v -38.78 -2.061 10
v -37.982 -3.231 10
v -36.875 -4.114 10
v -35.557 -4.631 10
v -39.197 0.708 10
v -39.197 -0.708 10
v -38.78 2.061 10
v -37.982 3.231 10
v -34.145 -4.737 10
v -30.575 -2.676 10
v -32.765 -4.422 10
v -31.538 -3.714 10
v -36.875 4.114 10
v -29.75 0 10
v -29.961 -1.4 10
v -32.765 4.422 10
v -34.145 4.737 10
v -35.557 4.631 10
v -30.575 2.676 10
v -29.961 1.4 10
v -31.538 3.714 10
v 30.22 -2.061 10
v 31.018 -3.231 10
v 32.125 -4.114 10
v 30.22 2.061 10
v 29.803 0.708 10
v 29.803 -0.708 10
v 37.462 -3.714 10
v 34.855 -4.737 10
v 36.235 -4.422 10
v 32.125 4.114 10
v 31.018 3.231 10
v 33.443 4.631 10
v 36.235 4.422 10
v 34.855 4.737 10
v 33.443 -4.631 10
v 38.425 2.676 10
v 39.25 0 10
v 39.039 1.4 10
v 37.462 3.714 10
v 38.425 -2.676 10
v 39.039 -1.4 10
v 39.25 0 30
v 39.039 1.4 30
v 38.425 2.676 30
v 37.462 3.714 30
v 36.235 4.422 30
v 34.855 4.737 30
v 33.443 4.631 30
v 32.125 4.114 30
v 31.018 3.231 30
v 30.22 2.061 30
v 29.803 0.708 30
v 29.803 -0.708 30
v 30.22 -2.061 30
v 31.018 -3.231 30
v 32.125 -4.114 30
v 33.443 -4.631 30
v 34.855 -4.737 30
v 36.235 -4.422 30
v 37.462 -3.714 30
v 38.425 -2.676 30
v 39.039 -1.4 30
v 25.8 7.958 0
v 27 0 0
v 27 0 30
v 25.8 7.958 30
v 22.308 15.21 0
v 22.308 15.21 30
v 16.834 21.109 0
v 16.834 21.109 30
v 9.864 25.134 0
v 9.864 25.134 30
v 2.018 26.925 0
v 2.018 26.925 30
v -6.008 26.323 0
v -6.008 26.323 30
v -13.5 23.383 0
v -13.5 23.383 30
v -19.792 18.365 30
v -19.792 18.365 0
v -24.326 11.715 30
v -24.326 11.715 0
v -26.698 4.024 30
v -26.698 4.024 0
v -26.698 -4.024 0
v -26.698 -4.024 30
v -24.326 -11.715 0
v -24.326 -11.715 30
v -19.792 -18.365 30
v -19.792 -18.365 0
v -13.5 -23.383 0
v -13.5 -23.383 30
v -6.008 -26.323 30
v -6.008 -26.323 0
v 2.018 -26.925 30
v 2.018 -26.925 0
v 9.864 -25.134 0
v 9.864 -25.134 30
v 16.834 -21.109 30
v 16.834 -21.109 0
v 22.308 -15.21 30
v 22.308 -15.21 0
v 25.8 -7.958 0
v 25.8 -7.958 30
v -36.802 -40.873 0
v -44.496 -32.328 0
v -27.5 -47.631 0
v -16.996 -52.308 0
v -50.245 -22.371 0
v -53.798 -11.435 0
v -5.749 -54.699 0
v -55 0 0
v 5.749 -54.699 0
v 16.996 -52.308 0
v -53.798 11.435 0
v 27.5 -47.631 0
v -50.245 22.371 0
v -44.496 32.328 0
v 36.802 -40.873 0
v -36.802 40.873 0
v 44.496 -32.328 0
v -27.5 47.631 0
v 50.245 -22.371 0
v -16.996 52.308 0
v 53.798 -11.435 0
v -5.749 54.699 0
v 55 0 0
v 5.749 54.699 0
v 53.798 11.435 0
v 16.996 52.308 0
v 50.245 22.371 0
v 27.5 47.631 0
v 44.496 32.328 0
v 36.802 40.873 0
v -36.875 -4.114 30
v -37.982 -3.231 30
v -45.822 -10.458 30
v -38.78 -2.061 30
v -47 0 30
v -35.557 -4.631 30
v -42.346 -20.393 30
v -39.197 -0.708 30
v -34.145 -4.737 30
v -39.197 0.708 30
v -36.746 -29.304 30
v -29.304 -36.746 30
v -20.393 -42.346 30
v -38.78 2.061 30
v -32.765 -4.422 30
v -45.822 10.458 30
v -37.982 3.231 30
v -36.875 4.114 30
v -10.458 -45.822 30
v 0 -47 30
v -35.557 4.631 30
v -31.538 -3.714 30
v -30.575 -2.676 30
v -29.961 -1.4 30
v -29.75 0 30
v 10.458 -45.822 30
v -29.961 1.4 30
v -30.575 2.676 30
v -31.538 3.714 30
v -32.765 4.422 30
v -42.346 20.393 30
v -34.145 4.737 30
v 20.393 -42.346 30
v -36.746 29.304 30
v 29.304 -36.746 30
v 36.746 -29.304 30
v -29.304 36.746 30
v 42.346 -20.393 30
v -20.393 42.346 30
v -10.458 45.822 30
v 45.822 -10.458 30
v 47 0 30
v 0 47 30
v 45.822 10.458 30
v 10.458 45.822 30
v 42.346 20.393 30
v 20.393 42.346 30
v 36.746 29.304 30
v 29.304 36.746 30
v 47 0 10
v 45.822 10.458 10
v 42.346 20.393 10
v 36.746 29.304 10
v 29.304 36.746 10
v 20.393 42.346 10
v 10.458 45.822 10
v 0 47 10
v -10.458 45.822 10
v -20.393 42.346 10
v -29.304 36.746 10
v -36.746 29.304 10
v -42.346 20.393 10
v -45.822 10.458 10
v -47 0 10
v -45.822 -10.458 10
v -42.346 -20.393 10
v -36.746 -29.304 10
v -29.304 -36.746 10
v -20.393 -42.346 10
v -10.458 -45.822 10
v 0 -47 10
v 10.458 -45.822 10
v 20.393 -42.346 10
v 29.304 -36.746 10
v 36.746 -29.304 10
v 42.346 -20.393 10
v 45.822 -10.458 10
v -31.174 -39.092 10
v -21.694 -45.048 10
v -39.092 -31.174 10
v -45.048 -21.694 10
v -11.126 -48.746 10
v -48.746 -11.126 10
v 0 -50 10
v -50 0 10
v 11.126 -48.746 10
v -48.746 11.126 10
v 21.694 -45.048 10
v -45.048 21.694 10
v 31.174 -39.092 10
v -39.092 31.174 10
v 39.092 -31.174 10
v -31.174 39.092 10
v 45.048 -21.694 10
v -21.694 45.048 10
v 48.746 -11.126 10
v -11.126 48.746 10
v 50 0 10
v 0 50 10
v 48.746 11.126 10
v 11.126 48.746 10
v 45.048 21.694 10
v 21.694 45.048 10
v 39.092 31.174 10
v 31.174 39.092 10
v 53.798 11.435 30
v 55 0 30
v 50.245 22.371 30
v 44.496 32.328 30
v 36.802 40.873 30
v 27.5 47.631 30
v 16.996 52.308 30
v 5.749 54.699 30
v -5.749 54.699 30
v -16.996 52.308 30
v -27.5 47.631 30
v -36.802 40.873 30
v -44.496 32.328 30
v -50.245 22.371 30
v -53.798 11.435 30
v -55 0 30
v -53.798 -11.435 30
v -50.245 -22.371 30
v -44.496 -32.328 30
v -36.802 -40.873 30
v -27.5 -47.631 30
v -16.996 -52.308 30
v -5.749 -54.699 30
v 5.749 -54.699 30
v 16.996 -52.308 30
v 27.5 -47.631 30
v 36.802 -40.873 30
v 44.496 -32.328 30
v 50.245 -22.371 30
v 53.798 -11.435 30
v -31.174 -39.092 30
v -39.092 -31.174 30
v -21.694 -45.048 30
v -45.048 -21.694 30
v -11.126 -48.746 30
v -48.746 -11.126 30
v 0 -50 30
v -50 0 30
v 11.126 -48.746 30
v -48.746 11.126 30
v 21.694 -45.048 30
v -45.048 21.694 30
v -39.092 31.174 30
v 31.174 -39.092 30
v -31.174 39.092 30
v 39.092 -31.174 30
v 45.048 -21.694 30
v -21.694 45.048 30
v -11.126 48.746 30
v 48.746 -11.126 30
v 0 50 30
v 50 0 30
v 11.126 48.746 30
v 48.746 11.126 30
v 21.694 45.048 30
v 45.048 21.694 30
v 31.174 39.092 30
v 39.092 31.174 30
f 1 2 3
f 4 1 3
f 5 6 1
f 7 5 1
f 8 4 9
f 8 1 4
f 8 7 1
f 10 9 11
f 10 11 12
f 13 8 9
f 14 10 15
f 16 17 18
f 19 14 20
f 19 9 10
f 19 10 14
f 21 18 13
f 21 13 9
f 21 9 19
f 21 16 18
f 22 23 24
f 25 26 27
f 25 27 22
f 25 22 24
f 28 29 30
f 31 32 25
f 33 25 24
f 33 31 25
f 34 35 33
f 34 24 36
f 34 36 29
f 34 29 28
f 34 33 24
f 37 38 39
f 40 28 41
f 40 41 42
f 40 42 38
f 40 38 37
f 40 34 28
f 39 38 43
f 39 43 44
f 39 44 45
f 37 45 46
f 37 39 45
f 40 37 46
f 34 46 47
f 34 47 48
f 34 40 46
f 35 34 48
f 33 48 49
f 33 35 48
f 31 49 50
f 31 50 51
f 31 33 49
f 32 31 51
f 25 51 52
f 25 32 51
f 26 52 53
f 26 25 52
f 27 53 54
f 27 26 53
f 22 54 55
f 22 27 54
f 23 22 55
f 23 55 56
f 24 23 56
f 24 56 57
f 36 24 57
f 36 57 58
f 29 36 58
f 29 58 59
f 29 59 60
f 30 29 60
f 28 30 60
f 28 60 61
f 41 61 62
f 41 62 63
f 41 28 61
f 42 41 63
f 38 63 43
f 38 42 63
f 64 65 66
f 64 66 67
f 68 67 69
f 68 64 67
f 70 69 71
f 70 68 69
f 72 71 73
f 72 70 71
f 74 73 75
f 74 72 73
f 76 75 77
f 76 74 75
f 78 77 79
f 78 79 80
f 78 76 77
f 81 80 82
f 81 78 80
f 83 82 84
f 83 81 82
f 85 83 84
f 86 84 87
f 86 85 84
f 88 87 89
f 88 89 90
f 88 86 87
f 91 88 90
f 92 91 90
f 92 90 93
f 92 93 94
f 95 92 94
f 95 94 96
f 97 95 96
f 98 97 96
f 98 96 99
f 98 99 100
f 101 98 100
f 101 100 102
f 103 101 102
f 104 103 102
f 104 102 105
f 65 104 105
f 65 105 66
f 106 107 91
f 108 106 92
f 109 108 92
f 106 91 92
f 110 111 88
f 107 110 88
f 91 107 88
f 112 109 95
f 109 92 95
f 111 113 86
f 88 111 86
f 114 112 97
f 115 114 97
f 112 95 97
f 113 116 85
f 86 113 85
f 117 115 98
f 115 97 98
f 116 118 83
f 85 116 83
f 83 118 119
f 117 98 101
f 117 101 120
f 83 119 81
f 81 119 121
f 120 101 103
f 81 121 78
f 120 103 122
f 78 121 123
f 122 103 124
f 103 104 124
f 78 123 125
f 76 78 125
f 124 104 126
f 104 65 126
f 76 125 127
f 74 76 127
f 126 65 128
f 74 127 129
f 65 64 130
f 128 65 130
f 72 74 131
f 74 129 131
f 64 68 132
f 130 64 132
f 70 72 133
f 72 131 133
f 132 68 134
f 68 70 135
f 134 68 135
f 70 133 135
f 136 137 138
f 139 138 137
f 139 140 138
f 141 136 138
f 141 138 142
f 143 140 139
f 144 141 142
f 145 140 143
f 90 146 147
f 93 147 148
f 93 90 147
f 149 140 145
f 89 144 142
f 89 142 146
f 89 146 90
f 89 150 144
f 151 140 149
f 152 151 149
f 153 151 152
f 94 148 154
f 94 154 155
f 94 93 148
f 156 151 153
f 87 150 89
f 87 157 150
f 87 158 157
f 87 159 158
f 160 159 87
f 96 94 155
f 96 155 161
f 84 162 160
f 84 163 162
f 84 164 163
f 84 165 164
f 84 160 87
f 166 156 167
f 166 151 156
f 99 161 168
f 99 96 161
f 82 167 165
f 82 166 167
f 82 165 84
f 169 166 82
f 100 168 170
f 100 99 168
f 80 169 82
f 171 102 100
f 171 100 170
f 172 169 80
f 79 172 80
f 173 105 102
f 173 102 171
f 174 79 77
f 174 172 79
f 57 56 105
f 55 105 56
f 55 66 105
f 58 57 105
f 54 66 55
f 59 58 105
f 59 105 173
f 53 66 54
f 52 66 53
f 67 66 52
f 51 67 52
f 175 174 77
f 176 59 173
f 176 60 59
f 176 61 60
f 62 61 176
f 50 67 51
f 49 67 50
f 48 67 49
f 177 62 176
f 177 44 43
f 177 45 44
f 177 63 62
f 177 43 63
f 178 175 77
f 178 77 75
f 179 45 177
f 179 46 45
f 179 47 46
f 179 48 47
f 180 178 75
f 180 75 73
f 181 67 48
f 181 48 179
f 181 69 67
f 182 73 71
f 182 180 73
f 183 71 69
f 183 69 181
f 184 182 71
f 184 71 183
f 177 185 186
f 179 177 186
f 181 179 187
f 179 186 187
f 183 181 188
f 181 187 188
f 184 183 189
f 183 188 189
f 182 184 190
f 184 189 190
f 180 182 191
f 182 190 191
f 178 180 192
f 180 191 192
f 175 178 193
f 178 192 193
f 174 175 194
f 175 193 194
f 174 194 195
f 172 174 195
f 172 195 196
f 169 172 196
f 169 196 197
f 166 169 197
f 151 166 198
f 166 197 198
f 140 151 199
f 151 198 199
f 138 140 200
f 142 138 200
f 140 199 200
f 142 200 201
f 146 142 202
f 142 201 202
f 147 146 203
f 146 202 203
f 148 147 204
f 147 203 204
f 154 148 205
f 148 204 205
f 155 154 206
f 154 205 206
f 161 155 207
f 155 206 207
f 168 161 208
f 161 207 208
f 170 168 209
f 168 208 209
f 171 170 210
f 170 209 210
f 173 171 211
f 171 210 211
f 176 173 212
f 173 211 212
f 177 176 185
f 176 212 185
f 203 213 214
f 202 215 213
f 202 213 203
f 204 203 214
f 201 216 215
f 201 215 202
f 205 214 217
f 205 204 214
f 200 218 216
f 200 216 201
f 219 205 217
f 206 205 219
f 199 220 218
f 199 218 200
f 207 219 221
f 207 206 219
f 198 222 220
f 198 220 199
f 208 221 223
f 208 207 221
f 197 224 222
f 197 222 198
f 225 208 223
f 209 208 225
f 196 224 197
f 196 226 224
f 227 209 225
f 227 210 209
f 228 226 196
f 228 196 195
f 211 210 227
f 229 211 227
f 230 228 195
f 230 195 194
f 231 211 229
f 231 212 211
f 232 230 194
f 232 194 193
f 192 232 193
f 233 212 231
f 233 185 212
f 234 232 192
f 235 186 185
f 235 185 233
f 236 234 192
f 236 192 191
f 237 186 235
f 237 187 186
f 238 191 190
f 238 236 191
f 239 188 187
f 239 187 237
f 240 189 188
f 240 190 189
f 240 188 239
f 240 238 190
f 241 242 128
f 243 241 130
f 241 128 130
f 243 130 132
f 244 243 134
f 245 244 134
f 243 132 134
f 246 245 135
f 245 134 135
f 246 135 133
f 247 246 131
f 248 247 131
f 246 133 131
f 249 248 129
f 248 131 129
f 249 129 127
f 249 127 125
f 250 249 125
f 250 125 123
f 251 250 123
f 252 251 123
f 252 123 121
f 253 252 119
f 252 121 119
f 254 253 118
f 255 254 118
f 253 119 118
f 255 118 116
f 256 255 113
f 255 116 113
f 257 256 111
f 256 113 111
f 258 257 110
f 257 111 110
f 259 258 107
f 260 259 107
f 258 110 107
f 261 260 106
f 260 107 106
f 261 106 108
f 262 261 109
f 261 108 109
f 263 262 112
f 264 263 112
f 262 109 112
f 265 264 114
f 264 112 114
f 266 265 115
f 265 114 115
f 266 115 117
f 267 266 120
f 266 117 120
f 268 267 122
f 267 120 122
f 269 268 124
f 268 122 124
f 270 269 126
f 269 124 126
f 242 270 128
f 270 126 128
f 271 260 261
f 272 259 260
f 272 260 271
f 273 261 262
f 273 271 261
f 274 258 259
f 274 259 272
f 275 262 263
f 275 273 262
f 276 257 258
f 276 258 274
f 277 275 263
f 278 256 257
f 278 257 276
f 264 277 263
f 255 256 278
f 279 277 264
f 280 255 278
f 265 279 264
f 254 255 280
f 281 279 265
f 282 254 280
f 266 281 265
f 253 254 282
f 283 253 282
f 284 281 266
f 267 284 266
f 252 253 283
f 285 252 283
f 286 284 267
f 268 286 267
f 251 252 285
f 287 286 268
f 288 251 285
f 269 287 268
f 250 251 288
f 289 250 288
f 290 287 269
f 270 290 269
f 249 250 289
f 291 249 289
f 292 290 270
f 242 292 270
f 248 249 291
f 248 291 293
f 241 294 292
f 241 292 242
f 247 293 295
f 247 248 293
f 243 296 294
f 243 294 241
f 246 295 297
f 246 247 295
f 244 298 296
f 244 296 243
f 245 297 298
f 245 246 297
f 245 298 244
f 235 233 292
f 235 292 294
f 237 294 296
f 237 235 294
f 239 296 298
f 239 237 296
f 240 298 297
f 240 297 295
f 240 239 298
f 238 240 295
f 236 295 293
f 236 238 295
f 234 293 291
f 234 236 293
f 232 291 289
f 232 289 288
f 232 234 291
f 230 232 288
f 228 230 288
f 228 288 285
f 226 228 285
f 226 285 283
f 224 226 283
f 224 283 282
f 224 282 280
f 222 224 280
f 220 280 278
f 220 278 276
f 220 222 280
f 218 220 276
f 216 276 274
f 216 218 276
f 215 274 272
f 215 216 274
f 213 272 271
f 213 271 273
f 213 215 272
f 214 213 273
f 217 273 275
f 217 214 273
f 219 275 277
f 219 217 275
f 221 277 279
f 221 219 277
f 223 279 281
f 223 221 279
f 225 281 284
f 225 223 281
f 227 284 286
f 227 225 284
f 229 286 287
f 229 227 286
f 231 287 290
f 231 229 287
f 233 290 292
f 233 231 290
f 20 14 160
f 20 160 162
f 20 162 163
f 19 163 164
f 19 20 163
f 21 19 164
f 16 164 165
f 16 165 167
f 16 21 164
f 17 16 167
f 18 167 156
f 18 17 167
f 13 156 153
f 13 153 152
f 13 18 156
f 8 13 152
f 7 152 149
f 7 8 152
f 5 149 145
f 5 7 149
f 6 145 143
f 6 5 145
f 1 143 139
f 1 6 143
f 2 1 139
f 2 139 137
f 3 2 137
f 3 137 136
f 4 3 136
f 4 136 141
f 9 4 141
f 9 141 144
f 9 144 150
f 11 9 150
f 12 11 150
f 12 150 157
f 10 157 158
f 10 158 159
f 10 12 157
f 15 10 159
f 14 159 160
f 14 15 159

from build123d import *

# Parameters (mm, degrees)
SKETCH1_R           = 55
SKETCH1_R_2         = 27
BOSS_EXTRUDE1_DEPTH = 10
SKETCH2_R           = 55
SKETCH2_R_2         = 50
SKETCH2_R_3         = 47
SKETCH2_R_4         = 4.75
SKETCH2_R_5         = 27
BOSS_EXTRUDE4_DEPTH = 20


with BuildPart() as part:
    # Sketch1 → Boss-Extrude1 (new body)
    with BuildSketch(Plane.XY):
        Circle(SKETCH1_R)
        Circle(SKETCH1_R_2, mode=Mode.SUBTRACT)
    extrude(amount=BOSS_EXTRUDE1_DEPTH)

    # Sketch2 → Boss-Extrude4 (add)
    # profile 1 of 2: a face of its own
    with BuildSketch(Plane.XY.offset(10)):
        Circle(SKETCH2_R)
        Circle(SKETCH2_R_2, mode=Mode.SUBTRACT)
    # profile 2 of 2: a face of its own
    with BuildSketch(Plane.XY.offset(10)):
        Circle(SKETCH2_R_3)
        with Locations((-34.5, 0)):
            Circle(SKETCH2_R_4, mode=Mode.SUBTRACT)
        with Locations((34.5, 0)):
            Circle(SKETCH2_R_4, mode=Mode.SUBTRACT)
        Circle(SKETCH2_R_5, mode=Mode.SUBTRACT)
    extrude(amount=BOSS_EXTRUDE4_DEPTH)


solid = part.part
